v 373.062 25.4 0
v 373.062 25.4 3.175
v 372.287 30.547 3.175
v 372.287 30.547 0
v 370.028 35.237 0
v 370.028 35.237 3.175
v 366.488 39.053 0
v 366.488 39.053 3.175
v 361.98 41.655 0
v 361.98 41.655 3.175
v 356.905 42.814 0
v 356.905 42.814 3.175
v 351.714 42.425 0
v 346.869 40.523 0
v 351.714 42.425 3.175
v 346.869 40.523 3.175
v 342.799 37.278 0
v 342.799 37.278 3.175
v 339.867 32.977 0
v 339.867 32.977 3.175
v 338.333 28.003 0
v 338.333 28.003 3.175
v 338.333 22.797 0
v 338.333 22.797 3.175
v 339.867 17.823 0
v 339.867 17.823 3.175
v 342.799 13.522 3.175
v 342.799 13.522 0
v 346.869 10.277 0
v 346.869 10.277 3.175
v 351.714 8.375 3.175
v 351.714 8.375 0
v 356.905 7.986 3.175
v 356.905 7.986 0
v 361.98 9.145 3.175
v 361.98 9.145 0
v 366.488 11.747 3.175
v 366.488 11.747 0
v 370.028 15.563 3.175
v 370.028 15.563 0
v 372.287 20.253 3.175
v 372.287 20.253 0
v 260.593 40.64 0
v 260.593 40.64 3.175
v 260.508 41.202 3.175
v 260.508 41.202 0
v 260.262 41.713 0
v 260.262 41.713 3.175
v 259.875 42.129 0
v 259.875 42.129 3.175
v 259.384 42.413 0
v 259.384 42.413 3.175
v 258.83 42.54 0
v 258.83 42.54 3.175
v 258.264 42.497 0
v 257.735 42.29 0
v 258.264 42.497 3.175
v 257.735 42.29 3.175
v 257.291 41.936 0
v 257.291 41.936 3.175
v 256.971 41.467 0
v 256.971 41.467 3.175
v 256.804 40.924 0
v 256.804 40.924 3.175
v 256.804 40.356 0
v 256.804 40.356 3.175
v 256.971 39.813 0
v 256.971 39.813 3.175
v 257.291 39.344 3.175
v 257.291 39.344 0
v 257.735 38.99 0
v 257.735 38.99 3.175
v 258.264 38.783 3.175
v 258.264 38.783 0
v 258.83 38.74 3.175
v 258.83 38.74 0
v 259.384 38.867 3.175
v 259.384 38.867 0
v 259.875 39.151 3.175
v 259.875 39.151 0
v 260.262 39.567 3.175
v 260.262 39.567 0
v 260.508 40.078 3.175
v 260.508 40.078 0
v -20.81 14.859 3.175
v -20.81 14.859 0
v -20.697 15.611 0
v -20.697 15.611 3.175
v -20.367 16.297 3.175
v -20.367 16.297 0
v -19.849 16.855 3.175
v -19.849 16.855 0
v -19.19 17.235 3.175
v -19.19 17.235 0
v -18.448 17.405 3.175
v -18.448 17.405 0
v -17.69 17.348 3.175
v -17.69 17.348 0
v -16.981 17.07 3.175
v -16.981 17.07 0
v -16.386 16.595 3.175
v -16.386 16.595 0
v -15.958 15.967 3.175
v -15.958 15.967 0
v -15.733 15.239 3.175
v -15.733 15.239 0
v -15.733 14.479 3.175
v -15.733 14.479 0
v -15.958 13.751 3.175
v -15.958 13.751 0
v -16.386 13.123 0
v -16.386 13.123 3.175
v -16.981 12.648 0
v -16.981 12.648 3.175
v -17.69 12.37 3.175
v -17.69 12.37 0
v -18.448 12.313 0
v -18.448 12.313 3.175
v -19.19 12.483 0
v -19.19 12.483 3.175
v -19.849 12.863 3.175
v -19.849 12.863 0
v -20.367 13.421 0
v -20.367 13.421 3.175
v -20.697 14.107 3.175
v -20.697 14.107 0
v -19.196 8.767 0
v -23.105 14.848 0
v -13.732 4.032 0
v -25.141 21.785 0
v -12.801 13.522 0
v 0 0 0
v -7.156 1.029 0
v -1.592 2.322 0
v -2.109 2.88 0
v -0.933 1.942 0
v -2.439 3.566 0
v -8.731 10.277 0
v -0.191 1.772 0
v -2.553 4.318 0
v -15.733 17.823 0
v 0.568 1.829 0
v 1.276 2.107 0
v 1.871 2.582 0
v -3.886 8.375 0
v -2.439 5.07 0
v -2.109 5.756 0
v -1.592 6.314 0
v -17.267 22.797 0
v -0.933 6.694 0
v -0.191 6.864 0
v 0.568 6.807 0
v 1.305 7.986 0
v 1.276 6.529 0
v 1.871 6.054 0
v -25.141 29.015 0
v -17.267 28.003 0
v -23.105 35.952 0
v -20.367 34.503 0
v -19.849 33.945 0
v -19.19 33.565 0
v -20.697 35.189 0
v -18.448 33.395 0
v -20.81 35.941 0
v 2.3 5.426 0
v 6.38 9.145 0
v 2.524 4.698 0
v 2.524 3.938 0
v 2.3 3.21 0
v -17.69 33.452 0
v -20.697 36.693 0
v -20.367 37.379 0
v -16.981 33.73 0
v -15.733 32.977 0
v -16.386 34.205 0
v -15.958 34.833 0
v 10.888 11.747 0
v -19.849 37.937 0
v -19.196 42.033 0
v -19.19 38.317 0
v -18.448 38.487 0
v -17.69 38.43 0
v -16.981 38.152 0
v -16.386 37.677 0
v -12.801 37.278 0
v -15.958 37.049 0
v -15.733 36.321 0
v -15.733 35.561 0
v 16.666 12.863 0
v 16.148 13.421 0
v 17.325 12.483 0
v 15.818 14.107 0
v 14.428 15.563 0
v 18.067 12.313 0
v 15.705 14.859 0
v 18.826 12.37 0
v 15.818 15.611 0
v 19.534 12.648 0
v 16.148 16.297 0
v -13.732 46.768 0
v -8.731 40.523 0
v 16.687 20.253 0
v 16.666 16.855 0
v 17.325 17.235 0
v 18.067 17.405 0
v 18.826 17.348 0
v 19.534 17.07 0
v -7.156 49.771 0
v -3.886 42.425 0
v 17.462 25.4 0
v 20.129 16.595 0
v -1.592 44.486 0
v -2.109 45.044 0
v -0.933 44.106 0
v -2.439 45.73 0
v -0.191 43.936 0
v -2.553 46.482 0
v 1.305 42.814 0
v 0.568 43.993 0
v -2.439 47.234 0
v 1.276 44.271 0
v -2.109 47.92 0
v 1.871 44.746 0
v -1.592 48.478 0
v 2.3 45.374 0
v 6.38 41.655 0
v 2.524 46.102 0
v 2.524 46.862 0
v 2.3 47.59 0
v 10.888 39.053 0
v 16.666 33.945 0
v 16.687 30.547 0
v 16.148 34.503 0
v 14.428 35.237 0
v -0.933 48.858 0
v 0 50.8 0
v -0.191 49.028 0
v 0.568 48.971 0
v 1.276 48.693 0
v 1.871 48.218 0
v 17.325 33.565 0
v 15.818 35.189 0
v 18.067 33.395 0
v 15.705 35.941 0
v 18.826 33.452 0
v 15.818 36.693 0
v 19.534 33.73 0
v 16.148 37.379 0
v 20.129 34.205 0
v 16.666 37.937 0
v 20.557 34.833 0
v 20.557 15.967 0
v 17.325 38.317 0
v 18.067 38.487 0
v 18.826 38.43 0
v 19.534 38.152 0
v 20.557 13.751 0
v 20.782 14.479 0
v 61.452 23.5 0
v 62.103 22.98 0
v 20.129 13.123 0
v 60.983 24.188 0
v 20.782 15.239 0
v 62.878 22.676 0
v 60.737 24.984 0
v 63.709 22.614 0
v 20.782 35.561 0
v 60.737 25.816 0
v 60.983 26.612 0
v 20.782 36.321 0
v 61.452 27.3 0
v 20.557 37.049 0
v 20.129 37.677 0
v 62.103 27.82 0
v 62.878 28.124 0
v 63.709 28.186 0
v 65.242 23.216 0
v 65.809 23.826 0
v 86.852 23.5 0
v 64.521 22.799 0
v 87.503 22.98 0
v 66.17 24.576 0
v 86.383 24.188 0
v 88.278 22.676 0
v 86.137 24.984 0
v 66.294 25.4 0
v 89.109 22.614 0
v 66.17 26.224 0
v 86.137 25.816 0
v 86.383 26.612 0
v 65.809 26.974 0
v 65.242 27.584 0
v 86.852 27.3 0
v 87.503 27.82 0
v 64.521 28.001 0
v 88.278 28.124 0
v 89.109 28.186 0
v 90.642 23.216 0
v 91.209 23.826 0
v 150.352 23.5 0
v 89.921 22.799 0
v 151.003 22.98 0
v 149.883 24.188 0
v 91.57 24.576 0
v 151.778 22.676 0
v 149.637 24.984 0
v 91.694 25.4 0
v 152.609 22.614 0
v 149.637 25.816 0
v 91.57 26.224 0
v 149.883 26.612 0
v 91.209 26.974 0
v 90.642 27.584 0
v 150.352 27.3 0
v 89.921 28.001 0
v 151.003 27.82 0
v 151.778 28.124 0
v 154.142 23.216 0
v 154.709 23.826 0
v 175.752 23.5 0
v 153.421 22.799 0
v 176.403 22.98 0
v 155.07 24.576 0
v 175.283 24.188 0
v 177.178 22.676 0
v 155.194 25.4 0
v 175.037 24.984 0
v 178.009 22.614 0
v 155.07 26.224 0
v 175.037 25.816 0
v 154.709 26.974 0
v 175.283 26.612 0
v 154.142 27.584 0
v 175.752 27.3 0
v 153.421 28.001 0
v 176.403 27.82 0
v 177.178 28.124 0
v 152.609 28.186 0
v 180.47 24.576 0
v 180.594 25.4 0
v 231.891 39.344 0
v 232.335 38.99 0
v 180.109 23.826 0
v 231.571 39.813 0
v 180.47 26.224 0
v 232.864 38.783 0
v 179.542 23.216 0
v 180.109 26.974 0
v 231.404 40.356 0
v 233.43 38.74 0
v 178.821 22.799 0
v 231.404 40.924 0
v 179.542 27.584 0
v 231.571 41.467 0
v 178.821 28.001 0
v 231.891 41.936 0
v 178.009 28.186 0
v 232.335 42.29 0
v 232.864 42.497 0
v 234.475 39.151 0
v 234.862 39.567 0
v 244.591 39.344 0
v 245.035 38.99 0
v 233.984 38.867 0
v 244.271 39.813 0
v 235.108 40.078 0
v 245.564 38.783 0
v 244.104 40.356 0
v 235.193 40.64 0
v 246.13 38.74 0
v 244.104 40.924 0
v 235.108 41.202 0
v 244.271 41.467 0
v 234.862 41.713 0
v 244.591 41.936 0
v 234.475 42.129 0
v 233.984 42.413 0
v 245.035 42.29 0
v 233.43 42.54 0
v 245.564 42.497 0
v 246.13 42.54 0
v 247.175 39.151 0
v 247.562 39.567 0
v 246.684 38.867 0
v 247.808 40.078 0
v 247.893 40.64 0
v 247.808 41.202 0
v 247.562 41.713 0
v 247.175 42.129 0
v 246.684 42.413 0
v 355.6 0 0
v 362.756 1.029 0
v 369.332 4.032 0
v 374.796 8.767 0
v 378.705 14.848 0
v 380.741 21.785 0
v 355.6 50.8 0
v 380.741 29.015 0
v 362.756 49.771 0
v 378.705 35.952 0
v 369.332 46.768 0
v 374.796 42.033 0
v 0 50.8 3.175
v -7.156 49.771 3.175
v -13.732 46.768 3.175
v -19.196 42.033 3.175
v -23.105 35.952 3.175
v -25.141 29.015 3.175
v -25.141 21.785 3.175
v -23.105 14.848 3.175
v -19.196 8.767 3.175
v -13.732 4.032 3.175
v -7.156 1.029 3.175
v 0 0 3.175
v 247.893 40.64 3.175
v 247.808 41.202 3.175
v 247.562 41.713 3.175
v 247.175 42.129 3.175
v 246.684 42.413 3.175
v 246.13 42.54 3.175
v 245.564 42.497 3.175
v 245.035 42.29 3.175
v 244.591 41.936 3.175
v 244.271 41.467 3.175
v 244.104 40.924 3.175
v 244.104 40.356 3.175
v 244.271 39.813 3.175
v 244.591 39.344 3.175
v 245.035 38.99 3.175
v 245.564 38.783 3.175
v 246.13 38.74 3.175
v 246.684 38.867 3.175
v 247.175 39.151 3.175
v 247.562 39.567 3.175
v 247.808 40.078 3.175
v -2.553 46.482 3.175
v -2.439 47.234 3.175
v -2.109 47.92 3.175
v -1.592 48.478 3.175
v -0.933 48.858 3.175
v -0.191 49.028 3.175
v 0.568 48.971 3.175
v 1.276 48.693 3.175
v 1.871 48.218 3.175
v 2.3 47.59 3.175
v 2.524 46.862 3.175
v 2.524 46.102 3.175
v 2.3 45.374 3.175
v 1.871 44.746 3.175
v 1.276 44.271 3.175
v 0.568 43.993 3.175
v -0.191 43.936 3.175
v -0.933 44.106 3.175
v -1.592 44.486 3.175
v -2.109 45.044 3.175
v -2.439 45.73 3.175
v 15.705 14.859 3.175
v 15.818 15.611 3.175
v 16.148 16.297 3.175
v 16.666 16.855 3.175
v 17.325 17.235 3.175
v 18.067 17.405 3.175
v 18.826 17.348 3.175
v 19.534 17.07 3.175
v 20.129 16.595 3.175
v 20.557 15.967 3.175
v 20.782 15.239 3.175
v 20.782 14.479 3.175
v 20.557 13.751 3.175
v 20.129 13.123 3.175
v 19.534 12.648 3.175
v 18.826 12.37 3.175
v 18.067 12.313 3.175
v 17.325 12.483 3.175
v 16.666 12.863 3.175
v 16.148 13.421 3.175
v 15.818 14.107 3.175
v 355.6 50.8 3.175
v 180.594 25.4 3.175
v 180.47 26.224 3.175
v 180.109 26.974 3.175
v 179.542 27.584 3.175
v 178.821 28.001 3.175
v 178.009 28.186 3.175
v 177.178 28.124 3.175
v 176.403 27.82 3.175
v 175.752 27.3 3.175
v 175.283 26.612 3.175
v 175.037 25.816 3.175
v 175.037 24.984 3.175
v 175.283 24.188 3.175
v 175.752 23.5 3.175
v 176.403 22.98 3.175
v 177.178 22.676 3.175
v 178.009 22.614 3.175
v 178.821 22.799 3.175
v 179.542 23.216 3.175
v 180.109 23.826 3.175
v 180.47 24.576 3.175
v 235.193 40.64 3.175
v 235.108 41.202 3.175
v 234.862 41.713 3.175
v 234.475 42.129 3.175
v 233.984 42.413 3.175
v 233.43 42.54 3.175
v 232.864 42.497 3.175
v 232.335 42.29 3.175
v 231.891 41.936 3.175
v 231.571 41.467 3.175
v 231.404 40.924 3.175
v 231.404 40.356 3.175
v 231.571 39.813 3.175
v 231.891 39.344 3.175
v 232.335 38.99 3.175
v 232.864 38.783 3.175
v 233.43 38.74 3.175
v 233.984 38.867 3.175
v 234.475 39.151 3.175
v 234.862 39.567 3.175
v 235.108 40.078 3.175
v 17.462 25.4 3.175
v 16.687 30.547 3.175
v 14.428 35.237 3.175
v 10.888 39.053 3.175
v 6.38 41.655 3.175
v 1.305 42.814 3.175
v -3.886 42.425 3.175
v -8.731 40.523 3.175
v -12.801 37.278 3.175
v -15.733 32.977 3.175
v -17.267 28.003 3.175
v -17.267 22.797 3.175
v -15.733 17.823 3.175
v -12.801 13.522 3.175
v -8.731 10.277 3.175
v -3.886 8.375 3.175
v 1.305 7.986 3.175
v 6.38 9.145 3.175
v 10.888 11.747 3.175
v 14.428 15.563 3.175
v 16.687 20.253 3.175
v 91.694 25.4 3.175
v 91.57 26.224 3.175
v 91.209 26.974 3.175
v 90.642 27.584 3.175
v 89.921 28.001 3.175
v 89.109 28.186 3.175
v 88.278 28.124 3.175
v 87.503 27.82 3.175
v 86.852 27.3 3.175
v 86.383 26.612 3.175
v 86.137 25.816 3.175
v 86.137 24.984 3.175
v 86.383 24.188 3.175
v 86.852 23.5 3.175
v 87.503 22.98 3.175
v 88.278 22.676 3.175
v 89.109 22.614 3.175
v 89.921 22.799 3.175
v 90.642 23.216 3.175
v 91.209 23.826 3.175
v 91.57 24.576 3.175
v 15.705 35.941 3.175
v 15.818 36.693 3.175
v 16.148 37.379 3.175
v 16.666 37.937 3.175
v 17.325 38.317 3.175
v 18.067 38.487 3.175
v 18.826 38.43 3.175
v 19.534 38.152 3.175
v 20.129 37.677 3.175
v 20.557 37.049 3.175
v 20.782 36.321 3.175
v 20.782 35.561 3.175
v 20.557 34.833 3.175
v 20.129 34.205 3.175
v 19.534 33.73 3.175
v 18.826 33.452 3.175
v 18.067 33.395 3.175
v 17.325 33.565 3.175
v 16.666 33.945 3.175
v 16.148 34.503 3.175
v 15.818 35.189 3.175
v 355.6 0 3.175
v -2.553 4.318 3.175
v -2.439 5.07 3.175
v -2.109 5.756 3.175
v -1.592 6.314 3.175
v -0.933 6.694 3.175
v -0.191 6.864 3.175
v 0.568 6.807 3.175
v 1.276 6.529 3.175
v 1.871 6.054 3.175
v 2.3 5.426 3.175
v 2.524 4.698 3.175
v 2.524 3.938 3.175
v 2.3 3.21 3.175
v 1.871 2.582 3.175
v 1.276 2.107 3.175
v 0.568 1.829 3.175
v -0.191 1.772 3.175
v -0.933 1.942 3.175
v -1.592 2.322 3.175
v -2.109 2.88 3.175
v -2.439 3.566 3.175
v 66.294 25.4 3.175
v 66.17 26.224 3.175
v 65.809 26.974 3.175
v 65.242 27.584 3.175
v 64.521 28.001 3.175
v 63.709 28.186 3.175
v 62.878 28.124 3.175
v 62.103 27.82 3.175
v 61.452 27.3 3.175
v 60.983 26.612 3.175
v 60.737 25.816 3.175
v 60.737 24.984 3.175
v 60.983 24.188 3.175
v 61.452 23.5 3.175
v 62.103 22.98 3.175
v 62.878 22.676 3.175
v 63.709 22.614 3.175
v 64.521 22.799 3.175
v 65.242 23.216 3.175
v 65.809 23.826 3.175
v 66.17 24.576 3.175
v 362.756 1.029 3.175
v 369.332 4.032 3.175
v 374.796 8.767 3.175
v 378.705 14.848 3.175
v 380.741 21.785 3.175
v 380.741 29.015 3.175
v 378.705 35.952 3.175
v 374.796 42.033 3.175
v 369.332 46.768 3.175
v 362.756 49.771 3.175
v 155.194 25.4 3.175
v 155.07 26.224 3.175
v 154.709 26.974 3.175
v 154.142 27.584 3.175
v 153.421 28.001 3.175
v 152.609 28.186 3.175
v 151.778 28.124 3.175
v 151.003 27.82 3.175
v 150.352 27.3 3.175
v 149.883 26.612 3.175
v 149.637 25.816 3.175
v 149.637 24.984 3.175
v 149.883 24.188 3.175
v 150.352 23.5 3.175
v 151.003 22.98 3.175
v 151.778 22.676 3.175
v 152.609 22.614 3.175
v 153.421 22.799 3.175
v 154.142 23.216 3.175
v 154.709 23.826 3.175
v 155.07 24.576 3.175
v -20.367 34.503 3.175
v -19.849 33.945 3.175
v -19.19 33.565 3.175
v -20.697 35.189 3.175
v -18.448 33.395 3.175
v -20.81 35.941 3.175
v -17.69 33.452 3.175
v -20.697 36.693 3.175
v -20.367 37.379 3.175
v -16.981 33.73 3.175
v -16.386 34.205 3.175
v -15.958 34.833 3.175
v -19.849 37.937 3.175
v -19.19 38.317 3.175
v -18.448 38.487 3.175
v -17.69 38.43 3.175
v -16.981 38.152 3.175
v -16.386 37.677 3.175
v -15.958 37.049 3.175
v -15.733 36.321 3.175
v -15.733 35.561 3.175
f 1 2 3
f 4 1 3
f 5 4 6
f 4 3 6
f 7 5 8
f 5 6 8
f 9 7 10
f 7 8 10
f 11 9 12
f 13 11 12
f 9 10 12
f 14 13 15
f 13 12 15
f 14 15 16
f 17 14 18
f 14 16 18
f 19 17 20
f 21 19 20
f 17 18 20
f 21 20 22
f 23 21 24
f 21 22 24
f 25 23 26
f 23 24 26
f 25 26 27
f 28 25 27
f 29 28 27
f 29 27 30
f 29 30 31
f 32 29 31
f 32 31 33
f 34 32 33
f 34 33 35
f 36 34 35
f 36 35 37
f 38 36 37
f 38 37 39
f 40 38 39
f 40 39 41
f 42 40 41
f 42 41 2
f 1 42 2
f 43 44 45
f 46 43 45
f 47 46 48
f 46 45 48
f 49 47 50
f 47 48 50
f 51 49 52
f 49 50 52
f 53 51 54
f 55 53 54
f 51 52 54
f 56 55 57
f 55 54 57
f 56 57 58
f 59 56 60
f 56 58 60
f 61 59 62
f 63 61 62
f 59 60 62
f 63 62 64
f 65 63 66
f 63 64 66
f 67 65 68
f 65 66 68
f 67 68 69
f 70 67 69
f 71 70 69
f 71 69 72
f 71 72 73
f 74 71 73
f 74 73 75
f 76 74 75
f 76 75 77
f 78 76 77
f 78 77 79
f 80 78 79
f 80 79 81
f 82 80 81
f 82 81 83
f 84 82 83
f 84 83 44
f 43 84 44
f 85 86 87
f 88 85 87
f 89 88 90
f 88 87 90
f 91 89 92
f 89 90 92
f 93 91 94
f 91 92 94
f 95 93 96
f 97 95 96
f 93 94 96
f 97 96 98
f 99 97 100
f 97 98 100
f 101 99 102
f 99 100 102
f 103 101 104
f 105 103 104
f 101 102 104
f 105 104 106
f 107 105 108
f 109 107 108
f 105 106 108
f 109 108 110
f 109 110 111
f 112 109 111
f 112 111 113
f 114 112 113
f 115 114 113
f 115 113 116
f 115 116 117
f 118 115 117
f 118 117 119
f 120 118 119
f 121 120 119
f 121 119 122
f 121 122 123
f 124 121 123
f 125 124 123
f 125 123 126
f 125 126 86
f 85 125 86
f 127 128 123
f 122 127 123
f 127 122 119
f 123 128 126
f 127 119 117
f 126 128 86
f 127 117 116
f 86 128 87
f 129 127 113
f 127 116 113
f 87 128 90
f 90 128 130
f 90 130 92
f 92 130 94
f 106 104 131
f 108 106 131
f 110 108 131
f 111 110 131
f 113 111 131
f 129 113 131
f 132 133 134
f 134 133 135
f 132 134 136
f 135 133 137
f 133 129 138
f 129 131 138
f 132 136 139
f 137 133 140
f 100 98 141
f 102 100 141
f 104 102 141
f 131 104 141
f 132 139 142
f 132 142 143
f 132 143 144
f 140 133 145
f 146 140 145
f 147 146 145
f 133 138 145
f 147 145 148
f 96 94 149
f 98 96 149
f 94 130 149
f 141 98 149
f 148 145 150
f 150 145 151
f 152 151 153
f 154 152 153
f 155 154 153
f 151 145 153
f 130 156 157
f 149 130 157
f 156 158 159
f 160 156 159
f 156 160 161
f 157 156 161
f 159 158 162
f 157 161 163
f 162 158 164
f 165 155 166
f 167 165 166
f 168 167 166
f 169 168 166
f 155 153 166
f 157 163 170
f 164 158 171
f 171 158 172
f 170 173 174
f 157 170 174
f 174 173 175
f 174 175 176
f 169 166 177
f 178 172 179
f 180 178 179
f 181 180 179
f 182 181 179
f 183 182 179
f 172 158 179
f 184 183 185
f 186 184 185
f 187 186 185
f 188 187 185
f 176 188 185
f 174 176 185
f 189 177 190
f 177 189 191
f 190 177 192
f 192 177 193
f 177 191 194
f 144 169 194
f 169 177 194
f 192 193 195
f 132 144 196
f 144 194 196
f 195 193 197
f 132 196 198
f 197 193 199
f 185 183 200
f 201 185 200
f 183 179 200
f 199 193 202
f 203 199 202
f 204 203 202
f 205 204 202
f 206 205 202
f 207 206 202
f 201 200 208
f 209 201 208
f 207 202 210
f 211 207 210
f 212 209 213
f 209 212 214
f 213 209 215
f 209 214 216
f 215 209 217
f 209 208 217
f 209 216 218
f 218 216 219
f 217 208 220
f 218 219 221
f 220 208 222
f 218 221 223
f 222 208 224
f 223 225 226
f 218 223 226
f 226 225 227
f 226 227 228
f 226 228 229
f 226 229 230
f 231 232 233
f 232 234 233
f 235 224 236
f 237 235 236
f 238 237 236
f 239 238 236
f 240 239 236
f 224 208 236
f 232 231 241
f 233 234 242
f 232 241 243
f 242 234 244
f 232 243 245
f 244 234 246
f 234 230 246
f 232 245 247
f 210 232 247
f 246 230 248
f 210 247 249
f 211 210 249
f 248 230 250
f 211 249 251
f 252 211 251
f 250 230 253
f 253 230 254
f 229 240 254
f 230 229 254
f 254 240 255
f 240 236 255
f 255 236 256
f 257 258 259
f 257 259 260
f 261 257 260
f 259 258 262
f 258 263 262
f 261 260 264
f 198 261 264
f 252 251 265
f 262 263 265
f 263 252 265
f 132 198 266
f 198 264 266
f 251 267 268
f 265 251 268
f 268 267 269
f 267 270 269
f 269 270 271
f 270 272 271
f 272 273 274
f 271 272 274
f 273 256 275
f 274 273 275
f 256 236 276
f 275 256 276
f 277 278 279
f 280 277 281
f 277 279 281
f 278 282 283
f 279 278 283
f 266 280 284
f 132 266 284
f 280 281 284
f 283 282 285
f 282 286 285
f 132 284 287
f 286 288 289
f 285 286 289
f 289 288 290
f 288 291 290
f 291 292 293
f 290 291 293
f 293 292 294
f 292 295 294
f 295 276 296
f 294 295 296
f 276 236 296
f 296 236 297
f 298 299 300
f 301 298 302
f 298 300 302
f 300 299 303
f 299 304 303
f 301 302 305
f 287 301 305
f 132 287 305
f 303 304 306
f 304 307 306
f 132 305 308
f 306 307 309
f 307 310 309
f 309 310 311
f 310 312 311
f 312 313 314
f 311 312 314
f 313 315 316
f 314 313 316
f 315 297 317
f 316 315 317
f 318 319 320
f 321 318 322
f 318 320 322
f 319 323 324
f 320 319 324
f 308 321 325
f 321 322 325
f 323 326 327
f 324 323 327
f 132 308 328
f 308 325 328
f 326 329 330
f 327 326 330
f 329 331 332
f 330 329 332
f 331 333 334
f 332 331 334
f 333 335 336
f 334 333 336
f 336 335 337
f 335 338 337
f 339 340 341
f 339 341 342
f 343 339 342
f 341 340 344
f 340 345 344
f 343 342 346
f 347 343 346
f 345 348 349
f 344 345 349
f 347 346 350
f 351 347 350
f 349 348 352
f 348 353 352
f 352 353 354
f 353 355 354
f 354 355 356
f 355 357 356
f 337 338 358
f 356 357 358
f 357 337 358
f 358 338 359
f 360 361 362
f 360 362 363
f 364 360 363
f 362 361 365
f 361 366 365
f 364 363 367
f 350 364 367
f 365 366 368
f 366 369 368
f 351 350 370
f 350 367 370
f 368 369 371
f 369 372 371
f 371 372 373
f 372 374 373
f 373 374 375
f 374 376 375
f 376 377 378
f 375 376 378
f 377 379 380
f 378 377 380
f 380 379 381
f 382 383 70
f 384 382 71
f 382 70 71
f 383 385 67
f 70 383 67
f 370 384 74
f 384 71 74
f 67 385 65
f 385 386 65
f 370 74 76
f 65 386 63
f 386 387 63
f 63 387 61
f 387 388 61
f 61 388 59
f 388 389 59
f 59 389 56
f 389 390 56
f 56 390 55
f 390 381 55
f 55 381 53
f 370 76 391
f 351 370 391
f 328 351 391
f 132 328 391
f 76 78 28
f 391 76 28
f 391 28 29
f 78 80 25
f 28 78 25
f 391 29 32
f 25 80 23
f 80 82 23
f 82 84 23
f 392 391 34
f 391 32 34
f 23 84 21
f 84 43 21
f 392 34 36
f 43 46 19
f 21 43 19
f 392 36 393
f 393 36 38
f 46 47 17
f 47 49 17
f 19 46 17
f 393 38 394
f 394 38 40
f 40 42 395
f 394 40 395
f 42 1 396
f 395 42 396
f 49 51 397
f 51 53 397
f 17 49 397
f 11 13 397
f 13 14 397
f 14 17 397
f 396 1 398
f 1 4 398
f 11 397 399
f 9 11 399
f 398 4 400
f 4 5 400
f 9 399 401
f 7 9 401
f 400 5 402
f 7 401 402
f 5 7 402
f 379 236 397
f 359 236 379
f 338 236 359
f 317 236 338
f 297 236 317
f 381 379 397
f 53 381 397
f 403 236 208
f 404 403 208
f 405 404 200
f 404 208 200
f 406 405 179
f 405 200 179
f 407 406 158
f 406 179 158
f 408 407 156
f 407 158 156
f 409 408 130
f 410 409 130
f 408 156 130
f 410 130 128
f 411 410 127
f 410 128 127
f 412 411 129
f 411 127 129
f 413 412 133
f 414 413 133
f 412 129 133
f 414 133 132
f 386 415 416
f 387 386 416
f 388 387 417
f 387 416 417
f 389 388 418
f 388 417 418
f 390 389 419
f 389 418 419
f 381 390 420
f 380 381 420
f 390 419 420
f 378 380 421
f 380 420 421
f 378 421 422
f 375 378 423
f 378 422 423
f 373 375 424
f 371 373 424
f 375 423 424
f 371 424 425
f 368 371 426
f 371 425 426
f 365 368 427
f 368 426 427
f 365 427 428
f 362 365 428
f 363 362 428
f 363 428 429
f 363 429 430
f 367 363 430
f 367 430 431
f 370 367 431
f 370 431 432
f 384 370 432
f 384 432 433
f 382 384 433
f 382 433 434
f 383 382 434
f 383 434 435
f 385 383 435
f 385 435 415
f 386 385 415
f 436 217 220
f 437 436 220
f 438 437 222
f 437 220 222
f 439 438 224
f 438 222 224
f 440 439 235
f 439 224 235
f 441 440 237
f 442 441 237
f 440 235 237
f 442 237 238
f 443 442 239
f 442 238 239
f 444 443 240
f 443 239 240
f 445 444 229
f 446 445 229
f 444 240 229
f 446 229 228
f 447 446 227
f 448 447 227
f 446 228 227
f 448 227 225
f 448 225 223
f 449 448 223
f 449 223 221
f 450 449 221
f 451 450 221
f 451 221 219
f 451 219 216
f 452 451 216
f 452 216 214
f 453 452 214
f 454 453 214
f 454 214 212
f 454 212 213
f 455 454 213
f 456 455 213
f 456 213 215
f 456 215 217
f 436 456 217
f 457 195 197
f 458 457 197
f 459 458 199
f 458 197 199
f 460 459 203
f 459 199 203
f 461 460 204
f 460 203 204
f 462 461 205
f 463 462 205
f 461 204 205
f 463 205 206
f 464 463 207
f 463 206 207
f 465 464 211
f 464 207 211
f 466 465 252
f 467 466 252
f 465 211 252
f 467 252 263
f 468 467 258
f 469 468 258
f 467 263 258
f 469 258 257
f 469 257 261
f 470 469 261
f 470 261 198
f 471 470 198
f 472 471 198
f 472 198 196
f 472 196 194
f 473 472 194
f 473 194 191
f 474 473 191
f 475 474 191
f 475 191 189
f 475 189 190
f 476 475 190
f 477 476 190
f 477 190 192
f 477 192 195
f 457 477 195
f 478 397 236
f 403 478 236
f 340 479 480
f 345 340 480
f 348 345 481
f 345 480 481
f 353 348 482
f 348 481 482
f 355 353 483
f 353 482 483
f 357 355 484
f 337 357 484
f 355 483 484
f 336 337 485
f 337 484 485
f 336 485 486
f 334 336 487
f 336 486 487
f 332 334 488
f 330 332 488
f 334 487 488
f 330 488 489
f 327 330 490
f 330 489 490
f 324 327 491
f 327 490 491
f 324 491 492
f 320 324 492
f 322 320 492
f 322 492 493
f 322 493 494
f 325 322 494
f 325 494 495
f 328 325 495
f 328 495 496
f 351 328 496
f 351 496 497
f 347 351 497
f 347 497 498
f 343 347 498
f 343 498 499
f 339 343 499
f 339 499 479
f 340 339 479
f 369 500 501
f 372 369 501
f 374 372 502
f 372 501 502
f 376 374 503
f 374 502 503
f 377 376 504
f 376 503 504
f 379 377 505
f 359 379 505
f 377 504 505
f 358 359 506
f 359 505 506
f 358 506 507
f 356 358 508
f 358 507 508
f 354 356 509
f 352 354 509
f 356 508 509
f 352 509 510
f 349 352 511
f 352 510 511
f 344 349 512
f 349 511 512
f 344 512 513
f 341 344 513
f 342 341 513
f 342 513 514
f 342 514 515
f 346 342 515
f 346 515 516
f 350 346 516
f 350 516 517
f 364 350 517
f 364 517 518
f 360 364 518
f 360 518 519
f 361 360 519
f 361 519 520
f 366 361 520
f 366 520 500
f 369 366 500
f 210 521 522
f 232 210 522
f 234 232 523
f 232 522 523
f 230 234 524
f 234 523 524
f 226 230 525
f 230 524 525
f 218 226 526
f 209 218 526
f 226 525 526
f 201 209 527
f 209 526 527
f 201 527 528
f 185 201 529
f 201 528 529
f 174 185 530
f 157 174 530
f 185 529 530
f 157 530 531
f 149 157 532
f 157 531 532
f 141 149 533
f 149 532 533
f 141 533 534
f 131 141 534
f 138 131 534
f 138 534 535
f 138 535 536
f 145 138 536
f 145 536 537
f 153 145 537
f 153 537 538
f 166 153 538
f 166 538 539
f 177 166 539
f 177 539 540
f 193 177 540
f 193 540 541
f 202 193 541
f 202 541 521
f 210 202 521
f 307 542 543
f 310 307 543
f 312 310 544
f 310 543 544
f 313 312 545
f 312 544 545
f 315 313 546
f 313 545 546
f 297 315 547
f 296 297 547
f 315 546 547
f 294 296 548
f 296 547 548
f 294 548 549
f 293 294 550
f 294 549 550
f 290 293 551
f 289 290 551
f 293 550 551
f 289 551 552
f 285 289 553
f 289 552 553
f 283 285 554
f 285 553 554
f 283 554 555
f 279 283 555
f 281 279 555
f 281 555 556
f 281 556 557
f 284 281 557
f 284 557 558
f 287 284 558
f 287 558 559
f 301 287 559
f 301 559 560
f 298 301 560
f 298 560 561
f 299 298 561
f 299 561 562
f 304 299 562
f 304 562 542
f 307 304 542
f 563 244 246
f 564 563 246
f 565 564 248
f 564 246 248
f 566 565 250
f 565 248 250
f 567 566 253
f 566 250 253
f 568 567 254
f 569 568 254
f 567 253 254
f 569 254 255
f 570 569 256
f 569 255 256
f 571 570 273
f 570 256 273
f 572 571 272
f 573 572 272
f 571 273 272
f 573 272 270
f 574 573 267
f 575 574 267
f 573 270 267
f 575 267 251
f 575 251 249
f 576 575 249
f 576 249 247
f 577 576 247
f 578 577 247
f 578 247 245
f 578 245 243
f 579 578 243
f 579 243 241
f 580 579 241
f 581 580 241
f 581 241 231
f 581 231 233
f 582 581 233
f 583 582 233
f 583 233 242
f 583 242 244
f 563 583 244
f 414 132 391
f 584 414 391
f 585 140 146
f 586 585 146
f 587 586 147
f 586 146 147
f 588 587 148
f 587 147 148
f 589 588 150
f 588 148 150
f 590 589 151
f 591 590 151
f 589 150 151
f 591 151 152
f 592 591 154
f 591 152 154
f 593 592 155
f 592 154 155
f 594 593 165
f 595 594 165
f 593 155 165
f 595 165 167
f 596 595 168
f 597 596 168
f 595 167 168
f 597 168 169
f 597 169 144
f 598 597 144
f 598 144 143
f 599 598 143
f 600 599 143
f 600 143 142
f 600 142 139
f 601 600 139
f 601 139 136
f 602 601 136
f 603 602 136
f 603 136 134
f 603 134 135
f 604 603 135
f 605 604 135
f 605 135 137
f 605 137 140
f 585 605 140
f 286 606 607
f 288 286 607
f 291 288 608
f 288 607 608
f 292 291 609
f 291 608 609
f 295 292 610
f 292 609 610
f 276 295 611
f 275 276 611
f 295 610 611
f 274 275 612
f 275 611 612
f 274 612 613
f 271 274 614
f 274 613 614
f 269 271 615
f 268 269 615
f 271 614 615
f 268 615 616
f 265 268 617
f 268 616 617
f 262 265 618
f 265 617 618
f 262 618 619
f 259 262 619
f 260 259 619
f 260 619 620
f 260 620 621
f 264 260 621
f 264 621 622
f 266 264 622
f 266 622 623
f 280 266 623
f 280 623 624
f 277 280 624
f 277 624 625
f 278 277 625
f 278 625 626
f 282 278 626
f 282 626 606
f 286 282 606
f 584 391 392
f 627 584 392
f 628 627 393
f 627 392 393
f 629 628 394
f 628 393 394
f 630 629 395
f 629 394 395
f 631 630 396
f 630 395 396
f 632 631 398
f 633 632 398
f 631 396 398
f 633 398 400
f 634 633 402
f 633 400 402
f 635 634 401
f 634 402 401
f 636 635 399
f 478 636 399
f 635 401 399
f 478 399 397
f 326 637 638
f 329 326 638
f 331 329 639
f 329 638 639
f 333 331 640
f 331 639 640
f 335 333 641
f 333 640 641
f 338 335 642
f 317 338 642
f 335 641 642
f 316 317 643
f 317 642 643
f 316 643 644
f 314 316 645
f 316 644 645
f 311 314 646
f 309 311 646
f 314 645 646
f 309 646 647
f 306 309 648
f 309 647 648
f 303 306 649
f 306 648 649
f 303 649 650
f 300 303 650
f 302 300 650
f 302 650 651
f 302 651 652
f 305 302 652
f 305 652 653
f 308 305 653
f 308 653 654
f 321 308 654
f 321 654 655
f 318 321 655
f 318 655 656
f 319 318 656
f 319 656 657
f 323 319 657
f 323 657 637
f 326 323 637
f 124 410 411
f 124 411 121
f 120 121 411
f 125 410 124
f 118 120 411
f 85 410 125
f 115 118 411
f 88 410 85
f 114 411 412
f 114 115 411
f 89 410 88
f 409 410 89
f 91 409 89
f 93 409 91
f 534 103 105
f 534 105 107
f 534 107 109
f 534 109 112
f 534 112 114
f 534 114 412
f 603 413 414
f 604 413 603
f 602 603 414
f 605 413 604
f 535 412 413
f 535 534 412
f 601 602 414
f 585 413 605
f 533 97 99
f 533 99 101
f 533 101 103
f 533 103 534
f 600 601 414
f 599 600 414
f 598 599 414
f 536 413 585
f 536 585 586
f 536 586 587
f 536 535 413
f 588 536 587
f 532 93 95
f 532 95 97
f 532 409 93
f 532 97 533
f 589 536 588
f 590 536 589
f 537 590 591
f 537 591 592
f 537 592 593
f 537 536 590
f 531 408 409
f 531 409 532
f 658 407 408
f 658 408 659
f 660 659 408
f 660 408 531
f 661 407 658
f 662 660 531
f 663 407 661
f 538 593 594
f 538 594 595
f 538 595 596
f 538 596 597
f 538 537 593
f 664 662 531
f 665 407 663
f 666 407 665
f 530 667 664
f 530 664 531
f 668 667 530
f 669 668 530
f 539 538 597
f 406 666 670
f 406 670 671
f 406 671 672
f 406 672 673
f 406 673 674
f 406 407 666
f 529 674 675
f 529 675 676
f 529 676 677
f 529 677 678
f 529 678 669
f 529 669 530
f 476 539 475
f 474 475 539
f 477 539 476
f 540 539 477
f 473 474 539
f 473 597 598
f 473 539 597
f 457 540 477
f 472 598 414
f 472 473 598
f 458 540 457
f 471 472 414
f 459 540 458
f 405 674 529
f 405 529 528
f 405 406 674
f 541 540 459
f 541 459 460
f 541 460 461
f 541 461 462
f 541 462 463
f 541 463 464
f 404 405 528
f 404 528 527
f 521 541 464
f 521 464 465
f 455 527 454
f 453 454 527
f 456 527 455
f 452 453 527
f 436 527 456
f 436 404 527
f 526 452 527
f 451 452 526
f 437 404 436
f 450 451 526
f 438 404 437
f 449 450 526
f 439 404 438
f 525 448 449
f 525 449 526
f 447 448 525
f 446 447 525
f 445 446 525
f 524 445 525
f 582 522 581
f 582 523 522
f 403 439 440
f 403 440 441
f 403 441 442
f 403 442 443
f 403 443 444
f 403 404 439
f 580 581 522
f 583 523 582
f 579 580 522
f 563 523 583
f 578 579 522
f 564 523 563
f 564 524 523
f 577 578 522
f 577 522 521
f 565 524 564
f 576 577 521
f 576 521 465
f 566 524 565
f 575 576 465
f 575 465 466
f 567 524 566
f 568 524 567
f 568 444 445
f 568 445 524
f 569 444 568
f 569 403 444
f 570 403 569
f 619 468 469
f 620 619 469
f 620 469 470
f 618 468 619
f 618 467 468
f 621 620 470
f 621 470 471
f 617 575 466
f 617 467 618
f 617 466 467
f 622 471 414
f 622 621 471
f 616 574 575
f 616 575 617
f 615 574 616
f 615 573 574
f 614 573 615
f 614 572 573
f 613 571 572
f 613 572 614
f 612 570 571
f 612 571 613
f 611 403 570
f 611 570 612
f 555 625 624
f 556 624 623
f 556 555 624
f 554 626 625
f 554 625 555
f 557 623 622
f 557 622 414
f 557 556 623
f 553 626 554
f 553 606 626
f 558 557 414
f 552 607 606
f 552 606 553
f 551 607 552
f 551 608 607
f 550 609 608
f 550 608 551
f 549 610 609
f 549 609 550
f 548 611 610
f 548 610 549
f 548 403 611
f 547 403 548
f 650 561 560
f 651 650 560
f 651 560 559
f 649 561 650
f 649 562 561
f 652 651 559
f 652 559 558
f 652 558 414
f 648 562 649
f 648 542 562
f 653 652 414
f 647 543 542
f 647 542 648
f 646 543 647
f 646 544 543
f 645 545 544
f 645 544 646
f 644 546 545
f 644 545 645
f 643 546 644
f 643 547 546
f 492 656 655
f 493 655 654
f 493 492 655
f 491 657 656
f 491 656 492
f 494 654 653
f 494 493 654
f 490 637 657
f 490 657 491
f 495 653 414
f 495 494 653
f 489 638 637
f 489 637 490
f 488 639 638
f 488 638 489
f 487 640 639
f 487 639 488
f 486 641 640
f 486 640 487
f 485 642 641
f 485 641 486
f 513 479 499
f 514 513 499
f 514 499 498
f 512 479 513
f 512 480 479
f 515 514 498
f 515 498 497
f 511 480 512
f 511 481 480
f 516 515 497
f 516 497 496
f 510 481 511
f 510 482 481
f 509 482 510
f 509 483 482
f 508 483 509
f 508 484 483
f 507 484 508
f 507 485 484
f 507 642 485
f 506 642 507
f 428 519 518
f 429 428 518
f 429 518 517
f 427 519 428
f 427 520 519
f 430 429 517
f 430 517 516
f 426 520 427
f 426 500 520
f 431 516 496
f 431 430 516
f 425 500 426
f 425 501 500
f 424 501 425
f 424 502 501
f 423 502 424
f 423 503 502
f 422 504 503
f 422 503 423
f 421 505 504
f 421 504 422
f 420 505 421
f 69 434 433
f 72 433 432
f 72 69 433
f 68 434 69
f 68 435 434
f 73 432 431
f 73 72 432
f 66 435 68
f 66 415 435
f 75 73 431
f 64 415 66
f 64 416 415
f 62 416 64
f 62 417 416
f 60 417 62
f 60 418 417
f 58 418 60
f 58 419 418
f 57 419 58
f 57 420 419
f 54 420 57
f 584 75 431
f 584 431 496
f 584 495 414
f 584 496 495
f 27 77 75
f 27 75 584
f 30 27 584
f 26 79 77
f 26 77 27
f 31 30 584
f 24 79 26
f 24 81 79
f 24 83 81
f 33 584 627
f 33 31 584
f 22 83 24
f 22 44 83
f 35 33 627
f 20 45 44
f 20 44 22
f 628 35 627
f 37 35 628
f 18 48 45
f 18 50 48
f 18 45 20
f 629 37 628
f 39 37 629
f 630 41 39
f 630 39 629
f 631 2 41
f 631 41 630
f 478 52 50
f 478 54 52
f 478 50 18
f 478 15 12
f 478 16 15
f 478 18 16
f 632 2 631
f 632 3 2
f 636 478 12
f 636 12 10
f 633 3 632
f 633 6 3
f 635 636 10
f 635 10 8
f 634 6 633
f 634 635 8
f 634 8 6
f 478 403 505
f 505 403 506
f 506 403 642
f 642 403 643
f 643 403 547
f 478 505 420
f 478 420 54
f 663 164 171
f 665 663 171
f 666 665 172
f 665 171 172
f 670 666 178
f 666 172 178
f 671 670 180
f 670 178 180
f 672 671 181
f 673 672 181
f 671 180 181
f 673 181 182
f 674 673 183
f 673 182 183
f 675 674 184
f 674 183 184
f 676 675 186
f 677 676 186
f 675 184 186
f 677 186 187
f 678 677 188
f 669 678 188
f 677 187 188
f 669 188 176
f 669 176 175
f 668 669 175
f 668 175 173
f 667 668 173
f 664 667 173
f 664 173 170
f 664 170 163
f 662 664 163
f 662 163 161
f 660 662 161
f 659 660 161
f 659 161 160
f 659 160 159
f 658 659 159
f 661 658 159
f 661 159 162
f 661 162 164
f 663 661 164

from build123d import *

# Parameters (mm, degrees)
BOSS_EXTRUDE1_DEPTH    = 3.175
SKETCH2_R              = 17.4625
CUT_EXTRUDE1_DEPTH     = 385.384860036
F_10_CLEARANCE_HOLE1_D = 5.1054
SKETCH6_R              = 2.794
CUT_EXTRUDE2_DEPTH     = 385.384860036
SKETCH7_R              = 1.905
CUT_EXTRUDE3_DEPTH     = 385.384860036


with BuildPart() as part:
    # Sketch1 → Boss-Extrude1 (new body)
    with BuildSketch(Plane.XY):
        with BuildLine():
            Line((0, 0), (355.6, 0))
            ThreePointArc((355.6, 0), (381, 25.4), (355.6, 50.8))
            Line((355.6, 50.8), (0, 50.8))
            ThreePointArc((0, 50.8), (-25.4, 25.4), (0, 0))
        make_face()
    extrude(amount=BOSS_EXTRUDE1_DEPTH)

    # Sketch2 → Cut-Extrude1 (cut, through all)
    with BuildSketch(Plane.XY.offset(3.175)):
        with Locations((0, 25.4)):
            Circle(SKETCH2_R)
        with Locations((355.6, 25.4)):
            Circle(SKETCH2_R)
    extrude(amount=-CUT_EXTRUDE1_DEPTH, mode=Mode.SUBTRACT)

    # #10 Clearance Hole1 (through all)
    with Locations(Plane(origin=(18.257547563, 35.941, 3.175), x_dir=(1, 0, 0), z_dir=(0, 0, 1))):
        with Locations((0, 0), (0, -21.082), (-18.257547563, -31.623), (-36.515095126, -21.082), (-36.515095126, 0), (-18.257547563, 10.541)):
            Hole(F_10_CLEARANCE_HOLE1_D / 2)

    # Sketch6 → Cut-Extrude2 (cut, through all)
    with BuildSketch(Plane.XY.offset(3.175)):
        with Locations((63.5, 25.4)):
            Circle(SKETCH6_R)
        with Locations((88.9, 25.4)):
            Circle(SKETCH6_R)
        with Locations((152.4, 25.4)):
            Circle(SKETCH6_R)
        with Locations((177.8, 25.4)):
            Circle(SKETCH6_R)
    extrude(amount=-CUT_EXTRUDE2_DEPTH, mode=Mode.SUBTRACT)

    # Sketch7 → Cut-Extrude3 (cut, through all)
    with BuildSketch(Plane.XY.offset(3.175)):
        with Locations((258.687715098, 40.64)):
            Circle(SKETCH7_R)
        with Locations((245.987715098, 40.64)):
            Circle(SKETCH7_R)
        with Locations((233.287715098, 40.64)):
            Circle(SKETCH7_R)
    extrude(amount=-CUT_EXTRUDE3_DEPTH, mode=Mode.SUBTRACT)


solid = part.part
